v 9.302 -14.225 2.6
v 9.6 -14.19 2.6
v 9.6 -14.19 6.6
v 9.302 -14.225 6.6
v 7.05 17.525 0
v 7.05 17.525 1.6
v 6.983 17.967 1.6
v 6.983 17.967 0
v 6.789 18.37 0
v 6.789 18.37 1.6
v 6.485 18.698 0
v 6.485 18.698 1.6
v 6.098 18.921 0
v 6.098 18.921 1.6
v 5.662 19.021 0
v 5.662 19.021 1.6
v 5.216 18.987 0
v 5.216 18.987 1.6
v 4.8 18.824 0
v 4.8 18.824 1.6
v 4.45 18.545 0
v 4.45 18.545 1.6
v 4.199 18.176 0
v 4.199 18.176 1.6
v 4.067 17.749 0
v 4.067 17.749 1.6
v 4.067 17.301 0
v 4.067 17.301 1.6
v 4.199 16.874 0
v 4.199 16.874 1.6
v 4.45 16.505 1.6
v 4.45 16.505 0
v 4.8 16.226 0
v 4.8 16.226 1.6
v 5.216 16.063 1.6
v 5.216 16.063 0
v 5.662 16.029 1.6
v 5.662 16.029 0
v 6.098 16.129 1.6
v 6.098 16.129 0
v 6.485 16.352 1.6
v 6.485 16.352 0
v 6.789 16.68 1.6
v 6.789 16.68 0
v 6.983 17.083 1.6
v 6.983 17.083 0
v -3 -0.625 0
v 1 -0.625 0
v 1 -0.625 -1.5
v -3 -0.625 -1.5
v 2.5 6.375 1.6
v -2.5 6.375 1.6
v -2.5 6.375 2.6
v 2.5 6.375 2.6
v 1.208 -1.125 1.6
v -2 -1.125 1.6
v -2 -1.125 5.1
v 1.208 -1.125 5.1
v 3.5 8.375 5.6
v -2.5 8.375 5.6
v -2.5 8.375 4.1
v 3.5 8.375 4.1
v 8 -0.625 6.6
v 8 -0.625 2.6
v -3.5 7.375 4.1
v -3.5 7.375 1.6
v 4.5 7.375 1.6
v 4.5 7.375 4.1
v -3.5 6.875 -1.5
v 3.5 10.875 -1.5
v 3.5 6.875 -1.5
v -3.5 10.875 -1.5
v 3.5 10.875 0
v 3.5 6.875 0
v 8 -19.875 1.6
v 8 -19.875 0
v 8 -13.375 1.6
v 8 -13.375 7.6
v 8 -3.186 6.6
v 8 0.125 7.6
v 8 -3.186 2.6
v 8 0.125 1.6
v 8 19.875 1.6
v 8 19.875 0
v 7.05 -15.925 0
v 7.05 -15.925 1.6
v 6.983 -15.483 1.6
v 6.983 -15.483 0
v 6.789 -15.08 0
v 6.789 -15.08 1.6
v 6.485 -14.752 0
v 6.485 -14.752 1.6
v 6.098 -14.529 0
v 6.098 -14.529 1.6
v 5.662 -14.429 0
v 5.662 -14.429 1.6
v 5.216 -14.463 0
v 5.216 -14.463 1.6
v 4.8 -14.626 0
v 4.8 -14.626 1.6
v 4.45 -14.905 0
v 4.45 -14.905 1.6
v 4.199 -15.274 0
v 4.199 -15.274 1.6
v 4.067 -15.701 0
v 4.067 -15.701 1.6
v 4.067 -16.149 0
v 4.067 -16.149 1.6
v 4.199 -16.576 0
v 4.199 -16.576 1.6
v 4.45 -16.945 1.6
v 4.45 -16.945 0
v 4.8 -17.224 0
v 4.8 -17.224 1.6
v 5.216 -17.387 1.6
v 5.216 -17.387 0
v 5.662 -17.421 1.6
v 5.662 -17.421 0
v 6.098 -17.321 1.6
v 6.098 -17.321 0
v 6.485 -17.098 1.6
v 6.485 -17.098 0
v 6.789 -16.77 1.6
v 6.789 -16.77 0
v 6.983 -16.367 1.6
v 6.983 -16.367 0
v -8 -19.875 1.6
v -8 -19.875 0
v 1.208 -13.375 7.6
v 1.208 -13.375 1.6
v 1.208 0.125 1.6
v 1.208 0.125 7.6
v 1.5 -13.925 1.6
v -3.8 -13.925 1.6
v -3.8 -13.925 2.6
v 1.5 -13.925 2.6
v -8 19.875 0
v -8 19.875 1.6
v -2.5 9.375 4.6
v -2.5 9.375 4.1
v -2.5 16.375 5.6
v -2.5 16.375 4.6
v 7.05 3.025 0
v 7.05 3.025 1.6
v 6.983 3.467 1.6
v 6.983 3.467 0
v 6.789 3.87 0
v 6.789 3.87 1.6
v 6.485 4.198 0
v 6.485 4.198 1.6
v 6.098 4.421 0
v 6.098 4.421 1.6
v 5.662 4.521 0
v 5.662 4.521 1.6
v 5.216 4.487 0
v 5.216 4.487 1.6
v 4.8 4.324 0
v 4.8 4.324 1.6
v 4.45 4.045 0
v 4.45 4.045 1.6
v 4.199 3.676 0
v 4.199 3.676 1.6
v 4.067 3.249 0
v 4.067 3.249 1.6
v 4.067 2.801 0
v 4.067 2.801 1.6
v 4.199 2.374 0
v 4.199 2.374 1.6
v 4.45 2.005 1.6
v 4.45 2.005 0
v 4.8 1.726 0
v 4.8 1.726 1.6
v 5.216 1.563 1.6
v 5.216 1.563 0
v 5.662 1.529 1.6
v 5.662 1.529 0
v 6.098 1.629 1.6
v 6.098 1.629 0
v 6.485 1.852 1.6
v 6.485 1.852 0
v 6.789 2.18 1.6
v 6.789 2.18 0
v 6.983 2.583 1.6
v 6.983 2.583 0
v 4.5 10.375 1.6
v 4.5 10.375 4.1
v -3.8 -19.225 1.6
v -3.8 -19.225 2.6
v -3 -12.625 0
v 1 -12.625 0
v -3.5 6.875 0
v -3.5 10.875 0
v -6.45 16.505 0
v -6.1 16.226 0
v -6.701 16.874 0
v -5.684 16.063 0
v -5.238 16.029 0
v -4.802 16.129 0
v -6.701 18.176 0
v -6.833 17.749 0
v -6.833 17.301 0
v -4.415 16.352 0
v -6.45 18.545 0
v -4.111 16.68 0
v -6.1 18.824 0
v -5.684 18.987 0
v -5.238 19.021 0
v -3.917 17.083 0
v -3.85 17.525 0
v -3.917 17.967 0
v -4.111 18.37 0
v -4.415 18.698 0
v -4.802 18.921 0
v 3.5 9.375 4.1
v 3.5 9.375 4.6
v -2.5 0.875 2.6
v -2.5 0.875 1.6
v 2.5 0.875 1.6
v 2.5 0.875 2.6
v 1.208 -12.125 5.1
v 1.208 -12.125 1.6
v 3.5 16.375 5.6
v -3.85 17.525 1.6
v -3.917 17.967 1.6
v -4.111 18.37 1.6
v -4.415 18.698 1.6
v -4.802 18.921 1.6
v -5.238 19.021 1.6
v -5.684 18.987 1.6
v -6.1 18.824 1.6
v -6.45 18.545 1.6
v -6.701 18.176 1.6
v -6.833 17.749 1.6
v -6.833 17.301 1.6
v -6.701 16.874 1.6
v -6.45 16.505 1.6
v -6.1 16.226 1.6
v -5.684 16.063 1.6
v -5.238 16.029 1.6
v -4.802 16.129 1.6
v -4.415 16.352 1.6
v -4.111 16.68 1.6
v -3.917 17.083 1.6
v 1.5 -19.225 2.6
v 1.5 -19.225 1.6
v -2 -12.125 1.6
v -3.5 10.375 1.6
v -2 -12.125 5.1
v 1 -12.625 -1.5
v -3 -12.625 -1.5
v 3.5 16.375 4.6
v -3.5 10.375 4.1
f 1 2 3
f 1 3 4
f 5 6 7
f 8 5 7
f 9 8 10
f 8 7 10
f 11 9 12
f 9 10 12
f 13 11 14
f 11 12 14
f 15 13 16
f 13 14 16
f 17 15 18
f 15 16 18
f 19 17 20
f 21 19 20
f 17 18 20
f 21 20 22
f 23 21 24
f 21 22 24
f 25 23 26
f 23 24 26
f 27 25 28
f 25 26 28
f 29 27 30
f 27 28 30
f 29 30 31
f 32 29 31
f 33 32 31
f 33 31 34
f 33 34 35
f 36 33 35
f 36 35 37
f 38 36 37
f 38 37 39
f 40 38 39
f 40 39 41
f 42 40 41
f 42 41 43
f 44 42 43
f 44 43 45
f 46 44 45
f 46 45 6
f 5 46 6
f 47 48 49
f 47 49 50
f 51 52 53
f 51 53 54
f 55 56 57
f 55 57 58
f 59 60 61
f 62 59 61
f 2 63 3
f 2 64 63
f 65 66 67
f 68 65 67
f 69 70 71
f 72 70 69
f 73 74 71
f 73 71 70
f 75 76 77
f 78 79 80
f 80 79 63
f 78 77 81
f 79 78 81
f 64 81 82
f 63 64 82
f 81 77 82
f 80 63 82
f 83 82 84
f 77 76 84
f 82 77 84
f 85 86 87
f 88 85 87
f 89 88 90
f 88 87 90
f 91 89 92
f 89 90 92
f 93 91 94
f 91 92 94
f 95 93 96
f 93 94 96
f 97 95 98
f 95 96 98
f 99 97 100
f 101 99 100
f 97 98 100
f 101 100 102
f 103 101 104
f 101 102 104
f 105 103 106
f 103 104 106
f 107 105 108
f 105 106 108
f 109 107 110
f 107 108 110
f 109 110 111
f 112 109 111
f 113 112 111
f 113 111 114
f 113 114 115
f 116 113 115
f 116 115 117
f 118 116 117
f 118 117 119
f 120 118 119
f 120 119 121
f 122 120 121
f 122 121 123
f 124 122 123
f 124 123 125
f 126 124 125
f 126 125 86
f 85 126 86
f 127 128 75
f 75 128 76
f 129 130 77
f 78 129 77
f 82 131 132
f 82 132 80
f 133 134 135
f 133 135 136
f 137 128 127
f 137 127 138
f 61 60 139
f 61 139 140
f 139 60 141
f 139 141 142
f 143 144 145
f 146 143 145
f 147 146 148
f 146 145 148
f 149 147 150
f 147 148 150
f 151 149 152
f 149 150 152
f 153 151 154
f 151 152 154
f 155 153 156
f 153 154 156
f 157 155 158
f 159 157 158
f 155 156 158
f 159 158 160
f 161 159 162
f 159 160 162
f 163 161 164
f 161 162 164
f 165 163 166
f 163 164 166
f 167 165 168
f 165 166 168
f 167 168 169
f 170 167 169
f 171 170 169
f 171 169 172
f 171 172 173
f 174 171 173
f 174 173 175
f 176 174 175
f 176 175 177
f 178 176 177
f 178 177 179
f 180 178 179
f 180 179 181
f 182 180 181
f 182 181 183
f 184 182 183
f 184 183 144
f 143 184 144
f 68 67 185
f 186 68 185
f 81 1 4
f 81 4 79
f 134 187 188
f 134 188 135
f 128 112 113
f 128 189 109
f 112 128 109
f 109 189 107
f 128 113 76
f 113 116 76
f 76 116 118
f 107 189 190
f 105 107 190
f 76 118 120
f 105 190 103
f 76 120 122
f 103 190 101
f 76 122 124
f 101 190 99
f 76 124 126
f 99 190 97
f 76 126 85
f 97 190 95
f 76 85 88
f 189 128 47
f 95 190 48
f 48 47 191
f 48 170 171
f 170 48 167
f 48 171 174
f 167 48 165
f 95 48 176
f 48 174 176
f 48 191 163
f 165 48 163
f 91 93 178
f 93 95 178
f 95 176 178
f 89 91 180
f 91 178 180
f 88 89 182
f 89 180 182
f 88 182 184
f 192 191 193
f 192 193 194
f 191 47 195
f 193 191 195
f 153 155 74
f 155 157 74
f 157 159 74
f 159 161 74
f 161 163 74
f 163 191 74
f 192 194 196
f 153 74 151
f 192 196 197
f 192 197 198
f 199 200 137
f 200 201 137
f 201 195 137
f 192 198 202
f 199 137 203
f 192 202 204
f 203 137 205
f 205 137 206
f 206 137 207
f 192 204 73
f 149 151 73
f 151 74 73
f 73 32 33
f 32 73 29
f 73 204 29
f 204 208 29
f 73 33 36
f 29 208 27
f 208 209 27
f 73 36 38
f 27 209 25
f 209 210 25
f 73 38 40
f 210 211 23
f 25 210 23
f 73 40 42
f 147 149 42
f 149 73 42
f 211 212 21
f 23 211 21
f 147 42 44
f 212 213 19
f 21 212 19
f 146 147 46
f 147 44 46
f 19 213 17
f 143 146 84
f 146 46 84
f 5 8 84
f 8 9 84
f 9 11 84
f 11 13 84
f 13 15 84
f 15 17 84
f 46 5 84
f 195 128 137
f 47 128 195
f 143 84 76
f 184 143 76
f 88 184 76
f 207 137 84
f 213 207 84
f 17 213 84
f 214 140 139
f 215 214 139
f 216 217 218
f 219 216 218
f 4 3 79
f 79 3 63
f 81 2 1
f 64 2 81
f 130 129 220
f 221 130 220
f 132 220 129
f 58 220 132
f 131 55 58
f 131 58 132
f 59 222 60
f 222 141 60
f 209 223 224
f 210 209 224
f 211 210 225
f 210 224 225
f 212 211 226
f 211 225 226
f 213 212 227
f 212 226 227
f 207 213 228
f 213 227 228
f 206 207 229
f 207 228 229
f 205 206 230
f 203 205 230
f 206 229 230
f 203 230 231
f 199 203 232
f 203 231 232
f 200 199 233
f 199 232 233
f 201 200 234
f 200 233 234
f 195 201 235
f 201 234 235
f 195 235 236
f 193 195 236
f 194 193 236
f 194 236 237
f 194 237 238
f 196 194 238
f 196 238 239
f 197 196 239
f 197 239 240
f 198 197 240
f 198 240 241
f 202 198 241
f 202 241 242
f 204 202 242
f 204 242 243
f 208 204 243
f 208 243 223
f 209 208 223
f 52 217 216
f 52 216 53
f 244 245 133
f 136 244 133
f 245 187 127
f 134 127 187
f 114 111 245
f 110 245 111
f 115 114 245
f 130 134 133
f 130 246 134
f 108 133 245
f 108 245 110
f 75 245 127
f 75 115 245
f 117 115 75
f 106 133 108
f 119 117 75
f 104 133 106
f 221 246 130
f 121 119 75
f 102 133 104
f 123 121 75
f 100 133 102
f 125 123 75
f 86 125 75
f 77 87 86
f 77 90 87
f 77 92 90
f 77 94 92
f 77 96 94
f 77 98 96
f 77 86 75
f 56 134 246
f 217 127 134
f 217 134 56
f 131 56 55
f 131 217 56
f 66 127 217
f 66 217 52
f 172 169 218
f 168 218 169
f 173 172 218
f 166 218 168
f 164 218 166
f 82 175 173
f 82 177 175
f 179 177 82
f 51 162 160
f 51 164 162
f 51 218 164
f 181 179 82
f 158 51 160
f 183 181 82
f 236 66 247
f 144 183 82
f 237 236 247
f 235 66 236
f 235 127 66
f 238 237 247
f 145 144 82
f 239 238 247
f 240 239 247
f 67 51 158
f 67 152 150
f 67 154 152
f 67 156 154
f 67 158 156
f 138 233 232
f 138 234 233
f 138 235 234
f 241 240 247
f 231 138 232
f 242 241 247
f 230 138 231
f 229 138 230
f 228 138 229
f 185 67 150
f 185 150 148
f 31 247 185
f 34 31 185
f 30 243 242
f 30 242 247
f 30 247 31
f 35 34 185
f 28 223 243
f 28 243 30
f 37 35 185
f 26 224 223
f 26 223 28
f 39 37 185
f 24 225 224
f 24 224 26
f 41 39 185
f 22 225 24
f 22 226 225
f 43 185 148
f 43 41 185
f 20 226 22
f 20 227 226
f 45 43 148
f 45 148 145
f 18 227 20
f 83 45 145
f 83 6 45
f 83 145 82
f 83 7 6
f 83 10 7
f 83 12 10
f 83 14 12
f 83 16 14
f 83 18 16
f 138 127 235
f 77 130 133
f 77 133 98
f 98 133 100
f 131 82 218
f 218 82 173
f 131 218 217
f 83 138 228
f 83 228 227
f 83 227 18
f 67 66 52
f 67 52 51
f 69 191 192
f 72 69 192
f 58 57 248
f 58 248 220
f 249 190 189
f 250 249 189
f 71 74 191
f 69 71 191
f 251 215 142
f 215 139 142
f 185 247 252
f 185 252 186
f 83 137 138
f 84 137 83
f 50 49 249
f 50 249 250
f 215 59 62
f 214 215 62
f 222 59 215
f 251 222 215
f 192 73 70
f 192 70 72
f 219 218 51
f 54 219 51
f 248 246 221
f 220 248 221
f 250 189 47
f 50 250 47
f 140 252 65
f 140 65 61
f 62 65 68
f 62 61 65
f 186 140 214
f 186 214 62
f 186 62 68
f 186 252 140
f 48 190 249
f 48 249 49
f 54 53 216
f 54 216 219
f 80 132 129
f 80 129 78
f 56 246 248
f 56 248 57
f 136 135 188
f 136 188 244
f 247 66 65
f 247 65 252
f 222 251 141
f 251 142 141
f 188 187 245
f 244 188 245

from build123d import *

# Parameters (mm, degrees)
CROQUIS3_W              = 16
CROQUIS3_H              = 39.75
SALIENTE_EXTRUIR1_DEPTH = 1.6
CROQUIS4_W              = 5
CROQUIS4_H              = 5.5
CROQUIS4_W_2            = 5.3
CROQUIS4_H_2            = 5.3
SALIENTE_EXTRUIR2_DEPTH = 1
CROQUIS5_W              = 6.792082101
CROQUIS5_H              = 13.5
SALIENTE_EXTRUIR3_DEPTH = 6
CROQUIS6_W              = 3.207917899
CROQUIS6_H              = 11
SALIENTE_EXTRUIR4_DEPTH = 3.5
CROQUIS7_W              = 8
CROQUIS7_H              = 3
SALIENTE_EXTRUIR5_DEPTH = 2.5
SALIENTE_EXTRUIR6_DEPTH = 3
CROQUIS9_R              = 1.5
CORTAR_EXTRUIR1_DEPTH   = 23.248946604
SALIENTE_EXTRUIR7_DEPTH = 2
CROQUIS11_W             = 7
CROQUIS11_H             = 4
CROQUIS11_W_2           = 4
CROQUIS11_H_2           = 12
SALIENTE_EXTRUIR8_DEPTH = 1.5


with BuildPart() as part:
    # Croquis3 → Saliente-Extruir1 (new body)
    with BuildSketch(Plane.XY):
        Rectangle(CROQUIS3_W, CROQUIS3_H)
    extrude(amount=SALIENTE_EXTRUIR1_DEPTH)

    # Croquis4 → Saliente-Extruir2 (add)
    with BuildSketch(Plane.XY.offset(1.6)):
        with Locations((0, 3.625)):
            Rectangle(CROQUIS4_W, CROQUIS4_H)
        with Locations((-1.15, -16.575)):
            Rectangle(CROQUIS4_W_2, CROQUIS4_H_2)
    extrude(amount=SALIENTE_EXTRUIR2_DEPTH)

    # Croquis5 → Saliente-Extruir3 (add)
    with BuildSketch(Plane.XY.offset(1.6)):
        with Locations((4.603958949, -6.625)):
            Rectangle(CROQUIS5_W, CROQUIS5_H)
    extrude(amount=SALIENTE_EXTRUIR3_DEPTH)

    # Croquis6 → Saliente-Extruir4 (add)
    with BuildSketch(Plane.XY.offset(1.6)):
        with Locations((-0.39604105, -6.625)):
            Rectangle(CROQUIS6_W, CROQUIS6_H)
    extrude(amount=SALIENTE_EXTRUIR4_DEPTH)

    # Croquis7 → Saliente-Extruir5 (add)
    with BuildSketch(Plane.XY.offset(1.6)):
        with Locations((0.5, 8.875)):
            Rectangle(CROQUIS7_W, CROQUIS7_H)
    extrude(amount=SALIENTE_EXTRUIR5_DEPTH)

    # Croquis8 → Saliente-Extruir6 (add, symmetric)
    with BuildSketch(Plane.ZY.offset(-0.5)):
        Polygon((4.1, 9.375), (4.6, 9.375), (4.6, 16.375), (5.6, 16.375), (5.6, 8.375), (4.1, 8.375), align=None)
    extrude(amount=SALIENTE_EXTRUIR6_DEPTH, both=True)

    # Croquis9 → Cortar-Extruir1 (cut, through all)
    with BuildSketch(Plane.XY.offset(1.6)):
        with Locations((5.55, 17.525)):
            Circle(CROQUIS9_R)
        with Locations((-5.35, 17.525)):
            Circle(CROQUIS9_R)
        with Locations((5.55, 3.025)):
            Circle(CROQUIS9_R)
        with Locations((5.55, -15.925)):
            Circle(CROQUIS9_R)
    extrude(amount=-CORTAR_EXTRUIR1_DEPTH, mode=Mode.SUBTRACT)

    # Croquis10 → Saliente-Extruir7 (add, symmetric)
    with BuildSketch(Plane(origin=(8, -13.375, 4.6), x_dir=(-1, 0, 0), z_dir=(0, 0, -1))):
        Polygon((0, 12.75), (-1.6, -0.814858061), (-1.302065369, -0.85), (0, 10.188957451), align=None)
    extrude(amount=SALIENTE_EXTRUIR7_DEPTH, both=True)

    # Croquis11 → Saliente-Extruir8 (add)
    with BuildSketch(Plane(origin=(0, 0, 0), x_dir=(-1, 0, 0), z_dir=(0, 0, -1))):
        with Locations((0, 8.875)):
            Rectangle(CROQUIS11_W, CROQUIS11_H)
        with Locations((1, -6.625)):
            Rectangle(CROQUIS11_W_2, CROQUIS11_H_2)
    extrude(amount=SALIENTE_EXTRUIR8_DEPTH)


solid = part.part
